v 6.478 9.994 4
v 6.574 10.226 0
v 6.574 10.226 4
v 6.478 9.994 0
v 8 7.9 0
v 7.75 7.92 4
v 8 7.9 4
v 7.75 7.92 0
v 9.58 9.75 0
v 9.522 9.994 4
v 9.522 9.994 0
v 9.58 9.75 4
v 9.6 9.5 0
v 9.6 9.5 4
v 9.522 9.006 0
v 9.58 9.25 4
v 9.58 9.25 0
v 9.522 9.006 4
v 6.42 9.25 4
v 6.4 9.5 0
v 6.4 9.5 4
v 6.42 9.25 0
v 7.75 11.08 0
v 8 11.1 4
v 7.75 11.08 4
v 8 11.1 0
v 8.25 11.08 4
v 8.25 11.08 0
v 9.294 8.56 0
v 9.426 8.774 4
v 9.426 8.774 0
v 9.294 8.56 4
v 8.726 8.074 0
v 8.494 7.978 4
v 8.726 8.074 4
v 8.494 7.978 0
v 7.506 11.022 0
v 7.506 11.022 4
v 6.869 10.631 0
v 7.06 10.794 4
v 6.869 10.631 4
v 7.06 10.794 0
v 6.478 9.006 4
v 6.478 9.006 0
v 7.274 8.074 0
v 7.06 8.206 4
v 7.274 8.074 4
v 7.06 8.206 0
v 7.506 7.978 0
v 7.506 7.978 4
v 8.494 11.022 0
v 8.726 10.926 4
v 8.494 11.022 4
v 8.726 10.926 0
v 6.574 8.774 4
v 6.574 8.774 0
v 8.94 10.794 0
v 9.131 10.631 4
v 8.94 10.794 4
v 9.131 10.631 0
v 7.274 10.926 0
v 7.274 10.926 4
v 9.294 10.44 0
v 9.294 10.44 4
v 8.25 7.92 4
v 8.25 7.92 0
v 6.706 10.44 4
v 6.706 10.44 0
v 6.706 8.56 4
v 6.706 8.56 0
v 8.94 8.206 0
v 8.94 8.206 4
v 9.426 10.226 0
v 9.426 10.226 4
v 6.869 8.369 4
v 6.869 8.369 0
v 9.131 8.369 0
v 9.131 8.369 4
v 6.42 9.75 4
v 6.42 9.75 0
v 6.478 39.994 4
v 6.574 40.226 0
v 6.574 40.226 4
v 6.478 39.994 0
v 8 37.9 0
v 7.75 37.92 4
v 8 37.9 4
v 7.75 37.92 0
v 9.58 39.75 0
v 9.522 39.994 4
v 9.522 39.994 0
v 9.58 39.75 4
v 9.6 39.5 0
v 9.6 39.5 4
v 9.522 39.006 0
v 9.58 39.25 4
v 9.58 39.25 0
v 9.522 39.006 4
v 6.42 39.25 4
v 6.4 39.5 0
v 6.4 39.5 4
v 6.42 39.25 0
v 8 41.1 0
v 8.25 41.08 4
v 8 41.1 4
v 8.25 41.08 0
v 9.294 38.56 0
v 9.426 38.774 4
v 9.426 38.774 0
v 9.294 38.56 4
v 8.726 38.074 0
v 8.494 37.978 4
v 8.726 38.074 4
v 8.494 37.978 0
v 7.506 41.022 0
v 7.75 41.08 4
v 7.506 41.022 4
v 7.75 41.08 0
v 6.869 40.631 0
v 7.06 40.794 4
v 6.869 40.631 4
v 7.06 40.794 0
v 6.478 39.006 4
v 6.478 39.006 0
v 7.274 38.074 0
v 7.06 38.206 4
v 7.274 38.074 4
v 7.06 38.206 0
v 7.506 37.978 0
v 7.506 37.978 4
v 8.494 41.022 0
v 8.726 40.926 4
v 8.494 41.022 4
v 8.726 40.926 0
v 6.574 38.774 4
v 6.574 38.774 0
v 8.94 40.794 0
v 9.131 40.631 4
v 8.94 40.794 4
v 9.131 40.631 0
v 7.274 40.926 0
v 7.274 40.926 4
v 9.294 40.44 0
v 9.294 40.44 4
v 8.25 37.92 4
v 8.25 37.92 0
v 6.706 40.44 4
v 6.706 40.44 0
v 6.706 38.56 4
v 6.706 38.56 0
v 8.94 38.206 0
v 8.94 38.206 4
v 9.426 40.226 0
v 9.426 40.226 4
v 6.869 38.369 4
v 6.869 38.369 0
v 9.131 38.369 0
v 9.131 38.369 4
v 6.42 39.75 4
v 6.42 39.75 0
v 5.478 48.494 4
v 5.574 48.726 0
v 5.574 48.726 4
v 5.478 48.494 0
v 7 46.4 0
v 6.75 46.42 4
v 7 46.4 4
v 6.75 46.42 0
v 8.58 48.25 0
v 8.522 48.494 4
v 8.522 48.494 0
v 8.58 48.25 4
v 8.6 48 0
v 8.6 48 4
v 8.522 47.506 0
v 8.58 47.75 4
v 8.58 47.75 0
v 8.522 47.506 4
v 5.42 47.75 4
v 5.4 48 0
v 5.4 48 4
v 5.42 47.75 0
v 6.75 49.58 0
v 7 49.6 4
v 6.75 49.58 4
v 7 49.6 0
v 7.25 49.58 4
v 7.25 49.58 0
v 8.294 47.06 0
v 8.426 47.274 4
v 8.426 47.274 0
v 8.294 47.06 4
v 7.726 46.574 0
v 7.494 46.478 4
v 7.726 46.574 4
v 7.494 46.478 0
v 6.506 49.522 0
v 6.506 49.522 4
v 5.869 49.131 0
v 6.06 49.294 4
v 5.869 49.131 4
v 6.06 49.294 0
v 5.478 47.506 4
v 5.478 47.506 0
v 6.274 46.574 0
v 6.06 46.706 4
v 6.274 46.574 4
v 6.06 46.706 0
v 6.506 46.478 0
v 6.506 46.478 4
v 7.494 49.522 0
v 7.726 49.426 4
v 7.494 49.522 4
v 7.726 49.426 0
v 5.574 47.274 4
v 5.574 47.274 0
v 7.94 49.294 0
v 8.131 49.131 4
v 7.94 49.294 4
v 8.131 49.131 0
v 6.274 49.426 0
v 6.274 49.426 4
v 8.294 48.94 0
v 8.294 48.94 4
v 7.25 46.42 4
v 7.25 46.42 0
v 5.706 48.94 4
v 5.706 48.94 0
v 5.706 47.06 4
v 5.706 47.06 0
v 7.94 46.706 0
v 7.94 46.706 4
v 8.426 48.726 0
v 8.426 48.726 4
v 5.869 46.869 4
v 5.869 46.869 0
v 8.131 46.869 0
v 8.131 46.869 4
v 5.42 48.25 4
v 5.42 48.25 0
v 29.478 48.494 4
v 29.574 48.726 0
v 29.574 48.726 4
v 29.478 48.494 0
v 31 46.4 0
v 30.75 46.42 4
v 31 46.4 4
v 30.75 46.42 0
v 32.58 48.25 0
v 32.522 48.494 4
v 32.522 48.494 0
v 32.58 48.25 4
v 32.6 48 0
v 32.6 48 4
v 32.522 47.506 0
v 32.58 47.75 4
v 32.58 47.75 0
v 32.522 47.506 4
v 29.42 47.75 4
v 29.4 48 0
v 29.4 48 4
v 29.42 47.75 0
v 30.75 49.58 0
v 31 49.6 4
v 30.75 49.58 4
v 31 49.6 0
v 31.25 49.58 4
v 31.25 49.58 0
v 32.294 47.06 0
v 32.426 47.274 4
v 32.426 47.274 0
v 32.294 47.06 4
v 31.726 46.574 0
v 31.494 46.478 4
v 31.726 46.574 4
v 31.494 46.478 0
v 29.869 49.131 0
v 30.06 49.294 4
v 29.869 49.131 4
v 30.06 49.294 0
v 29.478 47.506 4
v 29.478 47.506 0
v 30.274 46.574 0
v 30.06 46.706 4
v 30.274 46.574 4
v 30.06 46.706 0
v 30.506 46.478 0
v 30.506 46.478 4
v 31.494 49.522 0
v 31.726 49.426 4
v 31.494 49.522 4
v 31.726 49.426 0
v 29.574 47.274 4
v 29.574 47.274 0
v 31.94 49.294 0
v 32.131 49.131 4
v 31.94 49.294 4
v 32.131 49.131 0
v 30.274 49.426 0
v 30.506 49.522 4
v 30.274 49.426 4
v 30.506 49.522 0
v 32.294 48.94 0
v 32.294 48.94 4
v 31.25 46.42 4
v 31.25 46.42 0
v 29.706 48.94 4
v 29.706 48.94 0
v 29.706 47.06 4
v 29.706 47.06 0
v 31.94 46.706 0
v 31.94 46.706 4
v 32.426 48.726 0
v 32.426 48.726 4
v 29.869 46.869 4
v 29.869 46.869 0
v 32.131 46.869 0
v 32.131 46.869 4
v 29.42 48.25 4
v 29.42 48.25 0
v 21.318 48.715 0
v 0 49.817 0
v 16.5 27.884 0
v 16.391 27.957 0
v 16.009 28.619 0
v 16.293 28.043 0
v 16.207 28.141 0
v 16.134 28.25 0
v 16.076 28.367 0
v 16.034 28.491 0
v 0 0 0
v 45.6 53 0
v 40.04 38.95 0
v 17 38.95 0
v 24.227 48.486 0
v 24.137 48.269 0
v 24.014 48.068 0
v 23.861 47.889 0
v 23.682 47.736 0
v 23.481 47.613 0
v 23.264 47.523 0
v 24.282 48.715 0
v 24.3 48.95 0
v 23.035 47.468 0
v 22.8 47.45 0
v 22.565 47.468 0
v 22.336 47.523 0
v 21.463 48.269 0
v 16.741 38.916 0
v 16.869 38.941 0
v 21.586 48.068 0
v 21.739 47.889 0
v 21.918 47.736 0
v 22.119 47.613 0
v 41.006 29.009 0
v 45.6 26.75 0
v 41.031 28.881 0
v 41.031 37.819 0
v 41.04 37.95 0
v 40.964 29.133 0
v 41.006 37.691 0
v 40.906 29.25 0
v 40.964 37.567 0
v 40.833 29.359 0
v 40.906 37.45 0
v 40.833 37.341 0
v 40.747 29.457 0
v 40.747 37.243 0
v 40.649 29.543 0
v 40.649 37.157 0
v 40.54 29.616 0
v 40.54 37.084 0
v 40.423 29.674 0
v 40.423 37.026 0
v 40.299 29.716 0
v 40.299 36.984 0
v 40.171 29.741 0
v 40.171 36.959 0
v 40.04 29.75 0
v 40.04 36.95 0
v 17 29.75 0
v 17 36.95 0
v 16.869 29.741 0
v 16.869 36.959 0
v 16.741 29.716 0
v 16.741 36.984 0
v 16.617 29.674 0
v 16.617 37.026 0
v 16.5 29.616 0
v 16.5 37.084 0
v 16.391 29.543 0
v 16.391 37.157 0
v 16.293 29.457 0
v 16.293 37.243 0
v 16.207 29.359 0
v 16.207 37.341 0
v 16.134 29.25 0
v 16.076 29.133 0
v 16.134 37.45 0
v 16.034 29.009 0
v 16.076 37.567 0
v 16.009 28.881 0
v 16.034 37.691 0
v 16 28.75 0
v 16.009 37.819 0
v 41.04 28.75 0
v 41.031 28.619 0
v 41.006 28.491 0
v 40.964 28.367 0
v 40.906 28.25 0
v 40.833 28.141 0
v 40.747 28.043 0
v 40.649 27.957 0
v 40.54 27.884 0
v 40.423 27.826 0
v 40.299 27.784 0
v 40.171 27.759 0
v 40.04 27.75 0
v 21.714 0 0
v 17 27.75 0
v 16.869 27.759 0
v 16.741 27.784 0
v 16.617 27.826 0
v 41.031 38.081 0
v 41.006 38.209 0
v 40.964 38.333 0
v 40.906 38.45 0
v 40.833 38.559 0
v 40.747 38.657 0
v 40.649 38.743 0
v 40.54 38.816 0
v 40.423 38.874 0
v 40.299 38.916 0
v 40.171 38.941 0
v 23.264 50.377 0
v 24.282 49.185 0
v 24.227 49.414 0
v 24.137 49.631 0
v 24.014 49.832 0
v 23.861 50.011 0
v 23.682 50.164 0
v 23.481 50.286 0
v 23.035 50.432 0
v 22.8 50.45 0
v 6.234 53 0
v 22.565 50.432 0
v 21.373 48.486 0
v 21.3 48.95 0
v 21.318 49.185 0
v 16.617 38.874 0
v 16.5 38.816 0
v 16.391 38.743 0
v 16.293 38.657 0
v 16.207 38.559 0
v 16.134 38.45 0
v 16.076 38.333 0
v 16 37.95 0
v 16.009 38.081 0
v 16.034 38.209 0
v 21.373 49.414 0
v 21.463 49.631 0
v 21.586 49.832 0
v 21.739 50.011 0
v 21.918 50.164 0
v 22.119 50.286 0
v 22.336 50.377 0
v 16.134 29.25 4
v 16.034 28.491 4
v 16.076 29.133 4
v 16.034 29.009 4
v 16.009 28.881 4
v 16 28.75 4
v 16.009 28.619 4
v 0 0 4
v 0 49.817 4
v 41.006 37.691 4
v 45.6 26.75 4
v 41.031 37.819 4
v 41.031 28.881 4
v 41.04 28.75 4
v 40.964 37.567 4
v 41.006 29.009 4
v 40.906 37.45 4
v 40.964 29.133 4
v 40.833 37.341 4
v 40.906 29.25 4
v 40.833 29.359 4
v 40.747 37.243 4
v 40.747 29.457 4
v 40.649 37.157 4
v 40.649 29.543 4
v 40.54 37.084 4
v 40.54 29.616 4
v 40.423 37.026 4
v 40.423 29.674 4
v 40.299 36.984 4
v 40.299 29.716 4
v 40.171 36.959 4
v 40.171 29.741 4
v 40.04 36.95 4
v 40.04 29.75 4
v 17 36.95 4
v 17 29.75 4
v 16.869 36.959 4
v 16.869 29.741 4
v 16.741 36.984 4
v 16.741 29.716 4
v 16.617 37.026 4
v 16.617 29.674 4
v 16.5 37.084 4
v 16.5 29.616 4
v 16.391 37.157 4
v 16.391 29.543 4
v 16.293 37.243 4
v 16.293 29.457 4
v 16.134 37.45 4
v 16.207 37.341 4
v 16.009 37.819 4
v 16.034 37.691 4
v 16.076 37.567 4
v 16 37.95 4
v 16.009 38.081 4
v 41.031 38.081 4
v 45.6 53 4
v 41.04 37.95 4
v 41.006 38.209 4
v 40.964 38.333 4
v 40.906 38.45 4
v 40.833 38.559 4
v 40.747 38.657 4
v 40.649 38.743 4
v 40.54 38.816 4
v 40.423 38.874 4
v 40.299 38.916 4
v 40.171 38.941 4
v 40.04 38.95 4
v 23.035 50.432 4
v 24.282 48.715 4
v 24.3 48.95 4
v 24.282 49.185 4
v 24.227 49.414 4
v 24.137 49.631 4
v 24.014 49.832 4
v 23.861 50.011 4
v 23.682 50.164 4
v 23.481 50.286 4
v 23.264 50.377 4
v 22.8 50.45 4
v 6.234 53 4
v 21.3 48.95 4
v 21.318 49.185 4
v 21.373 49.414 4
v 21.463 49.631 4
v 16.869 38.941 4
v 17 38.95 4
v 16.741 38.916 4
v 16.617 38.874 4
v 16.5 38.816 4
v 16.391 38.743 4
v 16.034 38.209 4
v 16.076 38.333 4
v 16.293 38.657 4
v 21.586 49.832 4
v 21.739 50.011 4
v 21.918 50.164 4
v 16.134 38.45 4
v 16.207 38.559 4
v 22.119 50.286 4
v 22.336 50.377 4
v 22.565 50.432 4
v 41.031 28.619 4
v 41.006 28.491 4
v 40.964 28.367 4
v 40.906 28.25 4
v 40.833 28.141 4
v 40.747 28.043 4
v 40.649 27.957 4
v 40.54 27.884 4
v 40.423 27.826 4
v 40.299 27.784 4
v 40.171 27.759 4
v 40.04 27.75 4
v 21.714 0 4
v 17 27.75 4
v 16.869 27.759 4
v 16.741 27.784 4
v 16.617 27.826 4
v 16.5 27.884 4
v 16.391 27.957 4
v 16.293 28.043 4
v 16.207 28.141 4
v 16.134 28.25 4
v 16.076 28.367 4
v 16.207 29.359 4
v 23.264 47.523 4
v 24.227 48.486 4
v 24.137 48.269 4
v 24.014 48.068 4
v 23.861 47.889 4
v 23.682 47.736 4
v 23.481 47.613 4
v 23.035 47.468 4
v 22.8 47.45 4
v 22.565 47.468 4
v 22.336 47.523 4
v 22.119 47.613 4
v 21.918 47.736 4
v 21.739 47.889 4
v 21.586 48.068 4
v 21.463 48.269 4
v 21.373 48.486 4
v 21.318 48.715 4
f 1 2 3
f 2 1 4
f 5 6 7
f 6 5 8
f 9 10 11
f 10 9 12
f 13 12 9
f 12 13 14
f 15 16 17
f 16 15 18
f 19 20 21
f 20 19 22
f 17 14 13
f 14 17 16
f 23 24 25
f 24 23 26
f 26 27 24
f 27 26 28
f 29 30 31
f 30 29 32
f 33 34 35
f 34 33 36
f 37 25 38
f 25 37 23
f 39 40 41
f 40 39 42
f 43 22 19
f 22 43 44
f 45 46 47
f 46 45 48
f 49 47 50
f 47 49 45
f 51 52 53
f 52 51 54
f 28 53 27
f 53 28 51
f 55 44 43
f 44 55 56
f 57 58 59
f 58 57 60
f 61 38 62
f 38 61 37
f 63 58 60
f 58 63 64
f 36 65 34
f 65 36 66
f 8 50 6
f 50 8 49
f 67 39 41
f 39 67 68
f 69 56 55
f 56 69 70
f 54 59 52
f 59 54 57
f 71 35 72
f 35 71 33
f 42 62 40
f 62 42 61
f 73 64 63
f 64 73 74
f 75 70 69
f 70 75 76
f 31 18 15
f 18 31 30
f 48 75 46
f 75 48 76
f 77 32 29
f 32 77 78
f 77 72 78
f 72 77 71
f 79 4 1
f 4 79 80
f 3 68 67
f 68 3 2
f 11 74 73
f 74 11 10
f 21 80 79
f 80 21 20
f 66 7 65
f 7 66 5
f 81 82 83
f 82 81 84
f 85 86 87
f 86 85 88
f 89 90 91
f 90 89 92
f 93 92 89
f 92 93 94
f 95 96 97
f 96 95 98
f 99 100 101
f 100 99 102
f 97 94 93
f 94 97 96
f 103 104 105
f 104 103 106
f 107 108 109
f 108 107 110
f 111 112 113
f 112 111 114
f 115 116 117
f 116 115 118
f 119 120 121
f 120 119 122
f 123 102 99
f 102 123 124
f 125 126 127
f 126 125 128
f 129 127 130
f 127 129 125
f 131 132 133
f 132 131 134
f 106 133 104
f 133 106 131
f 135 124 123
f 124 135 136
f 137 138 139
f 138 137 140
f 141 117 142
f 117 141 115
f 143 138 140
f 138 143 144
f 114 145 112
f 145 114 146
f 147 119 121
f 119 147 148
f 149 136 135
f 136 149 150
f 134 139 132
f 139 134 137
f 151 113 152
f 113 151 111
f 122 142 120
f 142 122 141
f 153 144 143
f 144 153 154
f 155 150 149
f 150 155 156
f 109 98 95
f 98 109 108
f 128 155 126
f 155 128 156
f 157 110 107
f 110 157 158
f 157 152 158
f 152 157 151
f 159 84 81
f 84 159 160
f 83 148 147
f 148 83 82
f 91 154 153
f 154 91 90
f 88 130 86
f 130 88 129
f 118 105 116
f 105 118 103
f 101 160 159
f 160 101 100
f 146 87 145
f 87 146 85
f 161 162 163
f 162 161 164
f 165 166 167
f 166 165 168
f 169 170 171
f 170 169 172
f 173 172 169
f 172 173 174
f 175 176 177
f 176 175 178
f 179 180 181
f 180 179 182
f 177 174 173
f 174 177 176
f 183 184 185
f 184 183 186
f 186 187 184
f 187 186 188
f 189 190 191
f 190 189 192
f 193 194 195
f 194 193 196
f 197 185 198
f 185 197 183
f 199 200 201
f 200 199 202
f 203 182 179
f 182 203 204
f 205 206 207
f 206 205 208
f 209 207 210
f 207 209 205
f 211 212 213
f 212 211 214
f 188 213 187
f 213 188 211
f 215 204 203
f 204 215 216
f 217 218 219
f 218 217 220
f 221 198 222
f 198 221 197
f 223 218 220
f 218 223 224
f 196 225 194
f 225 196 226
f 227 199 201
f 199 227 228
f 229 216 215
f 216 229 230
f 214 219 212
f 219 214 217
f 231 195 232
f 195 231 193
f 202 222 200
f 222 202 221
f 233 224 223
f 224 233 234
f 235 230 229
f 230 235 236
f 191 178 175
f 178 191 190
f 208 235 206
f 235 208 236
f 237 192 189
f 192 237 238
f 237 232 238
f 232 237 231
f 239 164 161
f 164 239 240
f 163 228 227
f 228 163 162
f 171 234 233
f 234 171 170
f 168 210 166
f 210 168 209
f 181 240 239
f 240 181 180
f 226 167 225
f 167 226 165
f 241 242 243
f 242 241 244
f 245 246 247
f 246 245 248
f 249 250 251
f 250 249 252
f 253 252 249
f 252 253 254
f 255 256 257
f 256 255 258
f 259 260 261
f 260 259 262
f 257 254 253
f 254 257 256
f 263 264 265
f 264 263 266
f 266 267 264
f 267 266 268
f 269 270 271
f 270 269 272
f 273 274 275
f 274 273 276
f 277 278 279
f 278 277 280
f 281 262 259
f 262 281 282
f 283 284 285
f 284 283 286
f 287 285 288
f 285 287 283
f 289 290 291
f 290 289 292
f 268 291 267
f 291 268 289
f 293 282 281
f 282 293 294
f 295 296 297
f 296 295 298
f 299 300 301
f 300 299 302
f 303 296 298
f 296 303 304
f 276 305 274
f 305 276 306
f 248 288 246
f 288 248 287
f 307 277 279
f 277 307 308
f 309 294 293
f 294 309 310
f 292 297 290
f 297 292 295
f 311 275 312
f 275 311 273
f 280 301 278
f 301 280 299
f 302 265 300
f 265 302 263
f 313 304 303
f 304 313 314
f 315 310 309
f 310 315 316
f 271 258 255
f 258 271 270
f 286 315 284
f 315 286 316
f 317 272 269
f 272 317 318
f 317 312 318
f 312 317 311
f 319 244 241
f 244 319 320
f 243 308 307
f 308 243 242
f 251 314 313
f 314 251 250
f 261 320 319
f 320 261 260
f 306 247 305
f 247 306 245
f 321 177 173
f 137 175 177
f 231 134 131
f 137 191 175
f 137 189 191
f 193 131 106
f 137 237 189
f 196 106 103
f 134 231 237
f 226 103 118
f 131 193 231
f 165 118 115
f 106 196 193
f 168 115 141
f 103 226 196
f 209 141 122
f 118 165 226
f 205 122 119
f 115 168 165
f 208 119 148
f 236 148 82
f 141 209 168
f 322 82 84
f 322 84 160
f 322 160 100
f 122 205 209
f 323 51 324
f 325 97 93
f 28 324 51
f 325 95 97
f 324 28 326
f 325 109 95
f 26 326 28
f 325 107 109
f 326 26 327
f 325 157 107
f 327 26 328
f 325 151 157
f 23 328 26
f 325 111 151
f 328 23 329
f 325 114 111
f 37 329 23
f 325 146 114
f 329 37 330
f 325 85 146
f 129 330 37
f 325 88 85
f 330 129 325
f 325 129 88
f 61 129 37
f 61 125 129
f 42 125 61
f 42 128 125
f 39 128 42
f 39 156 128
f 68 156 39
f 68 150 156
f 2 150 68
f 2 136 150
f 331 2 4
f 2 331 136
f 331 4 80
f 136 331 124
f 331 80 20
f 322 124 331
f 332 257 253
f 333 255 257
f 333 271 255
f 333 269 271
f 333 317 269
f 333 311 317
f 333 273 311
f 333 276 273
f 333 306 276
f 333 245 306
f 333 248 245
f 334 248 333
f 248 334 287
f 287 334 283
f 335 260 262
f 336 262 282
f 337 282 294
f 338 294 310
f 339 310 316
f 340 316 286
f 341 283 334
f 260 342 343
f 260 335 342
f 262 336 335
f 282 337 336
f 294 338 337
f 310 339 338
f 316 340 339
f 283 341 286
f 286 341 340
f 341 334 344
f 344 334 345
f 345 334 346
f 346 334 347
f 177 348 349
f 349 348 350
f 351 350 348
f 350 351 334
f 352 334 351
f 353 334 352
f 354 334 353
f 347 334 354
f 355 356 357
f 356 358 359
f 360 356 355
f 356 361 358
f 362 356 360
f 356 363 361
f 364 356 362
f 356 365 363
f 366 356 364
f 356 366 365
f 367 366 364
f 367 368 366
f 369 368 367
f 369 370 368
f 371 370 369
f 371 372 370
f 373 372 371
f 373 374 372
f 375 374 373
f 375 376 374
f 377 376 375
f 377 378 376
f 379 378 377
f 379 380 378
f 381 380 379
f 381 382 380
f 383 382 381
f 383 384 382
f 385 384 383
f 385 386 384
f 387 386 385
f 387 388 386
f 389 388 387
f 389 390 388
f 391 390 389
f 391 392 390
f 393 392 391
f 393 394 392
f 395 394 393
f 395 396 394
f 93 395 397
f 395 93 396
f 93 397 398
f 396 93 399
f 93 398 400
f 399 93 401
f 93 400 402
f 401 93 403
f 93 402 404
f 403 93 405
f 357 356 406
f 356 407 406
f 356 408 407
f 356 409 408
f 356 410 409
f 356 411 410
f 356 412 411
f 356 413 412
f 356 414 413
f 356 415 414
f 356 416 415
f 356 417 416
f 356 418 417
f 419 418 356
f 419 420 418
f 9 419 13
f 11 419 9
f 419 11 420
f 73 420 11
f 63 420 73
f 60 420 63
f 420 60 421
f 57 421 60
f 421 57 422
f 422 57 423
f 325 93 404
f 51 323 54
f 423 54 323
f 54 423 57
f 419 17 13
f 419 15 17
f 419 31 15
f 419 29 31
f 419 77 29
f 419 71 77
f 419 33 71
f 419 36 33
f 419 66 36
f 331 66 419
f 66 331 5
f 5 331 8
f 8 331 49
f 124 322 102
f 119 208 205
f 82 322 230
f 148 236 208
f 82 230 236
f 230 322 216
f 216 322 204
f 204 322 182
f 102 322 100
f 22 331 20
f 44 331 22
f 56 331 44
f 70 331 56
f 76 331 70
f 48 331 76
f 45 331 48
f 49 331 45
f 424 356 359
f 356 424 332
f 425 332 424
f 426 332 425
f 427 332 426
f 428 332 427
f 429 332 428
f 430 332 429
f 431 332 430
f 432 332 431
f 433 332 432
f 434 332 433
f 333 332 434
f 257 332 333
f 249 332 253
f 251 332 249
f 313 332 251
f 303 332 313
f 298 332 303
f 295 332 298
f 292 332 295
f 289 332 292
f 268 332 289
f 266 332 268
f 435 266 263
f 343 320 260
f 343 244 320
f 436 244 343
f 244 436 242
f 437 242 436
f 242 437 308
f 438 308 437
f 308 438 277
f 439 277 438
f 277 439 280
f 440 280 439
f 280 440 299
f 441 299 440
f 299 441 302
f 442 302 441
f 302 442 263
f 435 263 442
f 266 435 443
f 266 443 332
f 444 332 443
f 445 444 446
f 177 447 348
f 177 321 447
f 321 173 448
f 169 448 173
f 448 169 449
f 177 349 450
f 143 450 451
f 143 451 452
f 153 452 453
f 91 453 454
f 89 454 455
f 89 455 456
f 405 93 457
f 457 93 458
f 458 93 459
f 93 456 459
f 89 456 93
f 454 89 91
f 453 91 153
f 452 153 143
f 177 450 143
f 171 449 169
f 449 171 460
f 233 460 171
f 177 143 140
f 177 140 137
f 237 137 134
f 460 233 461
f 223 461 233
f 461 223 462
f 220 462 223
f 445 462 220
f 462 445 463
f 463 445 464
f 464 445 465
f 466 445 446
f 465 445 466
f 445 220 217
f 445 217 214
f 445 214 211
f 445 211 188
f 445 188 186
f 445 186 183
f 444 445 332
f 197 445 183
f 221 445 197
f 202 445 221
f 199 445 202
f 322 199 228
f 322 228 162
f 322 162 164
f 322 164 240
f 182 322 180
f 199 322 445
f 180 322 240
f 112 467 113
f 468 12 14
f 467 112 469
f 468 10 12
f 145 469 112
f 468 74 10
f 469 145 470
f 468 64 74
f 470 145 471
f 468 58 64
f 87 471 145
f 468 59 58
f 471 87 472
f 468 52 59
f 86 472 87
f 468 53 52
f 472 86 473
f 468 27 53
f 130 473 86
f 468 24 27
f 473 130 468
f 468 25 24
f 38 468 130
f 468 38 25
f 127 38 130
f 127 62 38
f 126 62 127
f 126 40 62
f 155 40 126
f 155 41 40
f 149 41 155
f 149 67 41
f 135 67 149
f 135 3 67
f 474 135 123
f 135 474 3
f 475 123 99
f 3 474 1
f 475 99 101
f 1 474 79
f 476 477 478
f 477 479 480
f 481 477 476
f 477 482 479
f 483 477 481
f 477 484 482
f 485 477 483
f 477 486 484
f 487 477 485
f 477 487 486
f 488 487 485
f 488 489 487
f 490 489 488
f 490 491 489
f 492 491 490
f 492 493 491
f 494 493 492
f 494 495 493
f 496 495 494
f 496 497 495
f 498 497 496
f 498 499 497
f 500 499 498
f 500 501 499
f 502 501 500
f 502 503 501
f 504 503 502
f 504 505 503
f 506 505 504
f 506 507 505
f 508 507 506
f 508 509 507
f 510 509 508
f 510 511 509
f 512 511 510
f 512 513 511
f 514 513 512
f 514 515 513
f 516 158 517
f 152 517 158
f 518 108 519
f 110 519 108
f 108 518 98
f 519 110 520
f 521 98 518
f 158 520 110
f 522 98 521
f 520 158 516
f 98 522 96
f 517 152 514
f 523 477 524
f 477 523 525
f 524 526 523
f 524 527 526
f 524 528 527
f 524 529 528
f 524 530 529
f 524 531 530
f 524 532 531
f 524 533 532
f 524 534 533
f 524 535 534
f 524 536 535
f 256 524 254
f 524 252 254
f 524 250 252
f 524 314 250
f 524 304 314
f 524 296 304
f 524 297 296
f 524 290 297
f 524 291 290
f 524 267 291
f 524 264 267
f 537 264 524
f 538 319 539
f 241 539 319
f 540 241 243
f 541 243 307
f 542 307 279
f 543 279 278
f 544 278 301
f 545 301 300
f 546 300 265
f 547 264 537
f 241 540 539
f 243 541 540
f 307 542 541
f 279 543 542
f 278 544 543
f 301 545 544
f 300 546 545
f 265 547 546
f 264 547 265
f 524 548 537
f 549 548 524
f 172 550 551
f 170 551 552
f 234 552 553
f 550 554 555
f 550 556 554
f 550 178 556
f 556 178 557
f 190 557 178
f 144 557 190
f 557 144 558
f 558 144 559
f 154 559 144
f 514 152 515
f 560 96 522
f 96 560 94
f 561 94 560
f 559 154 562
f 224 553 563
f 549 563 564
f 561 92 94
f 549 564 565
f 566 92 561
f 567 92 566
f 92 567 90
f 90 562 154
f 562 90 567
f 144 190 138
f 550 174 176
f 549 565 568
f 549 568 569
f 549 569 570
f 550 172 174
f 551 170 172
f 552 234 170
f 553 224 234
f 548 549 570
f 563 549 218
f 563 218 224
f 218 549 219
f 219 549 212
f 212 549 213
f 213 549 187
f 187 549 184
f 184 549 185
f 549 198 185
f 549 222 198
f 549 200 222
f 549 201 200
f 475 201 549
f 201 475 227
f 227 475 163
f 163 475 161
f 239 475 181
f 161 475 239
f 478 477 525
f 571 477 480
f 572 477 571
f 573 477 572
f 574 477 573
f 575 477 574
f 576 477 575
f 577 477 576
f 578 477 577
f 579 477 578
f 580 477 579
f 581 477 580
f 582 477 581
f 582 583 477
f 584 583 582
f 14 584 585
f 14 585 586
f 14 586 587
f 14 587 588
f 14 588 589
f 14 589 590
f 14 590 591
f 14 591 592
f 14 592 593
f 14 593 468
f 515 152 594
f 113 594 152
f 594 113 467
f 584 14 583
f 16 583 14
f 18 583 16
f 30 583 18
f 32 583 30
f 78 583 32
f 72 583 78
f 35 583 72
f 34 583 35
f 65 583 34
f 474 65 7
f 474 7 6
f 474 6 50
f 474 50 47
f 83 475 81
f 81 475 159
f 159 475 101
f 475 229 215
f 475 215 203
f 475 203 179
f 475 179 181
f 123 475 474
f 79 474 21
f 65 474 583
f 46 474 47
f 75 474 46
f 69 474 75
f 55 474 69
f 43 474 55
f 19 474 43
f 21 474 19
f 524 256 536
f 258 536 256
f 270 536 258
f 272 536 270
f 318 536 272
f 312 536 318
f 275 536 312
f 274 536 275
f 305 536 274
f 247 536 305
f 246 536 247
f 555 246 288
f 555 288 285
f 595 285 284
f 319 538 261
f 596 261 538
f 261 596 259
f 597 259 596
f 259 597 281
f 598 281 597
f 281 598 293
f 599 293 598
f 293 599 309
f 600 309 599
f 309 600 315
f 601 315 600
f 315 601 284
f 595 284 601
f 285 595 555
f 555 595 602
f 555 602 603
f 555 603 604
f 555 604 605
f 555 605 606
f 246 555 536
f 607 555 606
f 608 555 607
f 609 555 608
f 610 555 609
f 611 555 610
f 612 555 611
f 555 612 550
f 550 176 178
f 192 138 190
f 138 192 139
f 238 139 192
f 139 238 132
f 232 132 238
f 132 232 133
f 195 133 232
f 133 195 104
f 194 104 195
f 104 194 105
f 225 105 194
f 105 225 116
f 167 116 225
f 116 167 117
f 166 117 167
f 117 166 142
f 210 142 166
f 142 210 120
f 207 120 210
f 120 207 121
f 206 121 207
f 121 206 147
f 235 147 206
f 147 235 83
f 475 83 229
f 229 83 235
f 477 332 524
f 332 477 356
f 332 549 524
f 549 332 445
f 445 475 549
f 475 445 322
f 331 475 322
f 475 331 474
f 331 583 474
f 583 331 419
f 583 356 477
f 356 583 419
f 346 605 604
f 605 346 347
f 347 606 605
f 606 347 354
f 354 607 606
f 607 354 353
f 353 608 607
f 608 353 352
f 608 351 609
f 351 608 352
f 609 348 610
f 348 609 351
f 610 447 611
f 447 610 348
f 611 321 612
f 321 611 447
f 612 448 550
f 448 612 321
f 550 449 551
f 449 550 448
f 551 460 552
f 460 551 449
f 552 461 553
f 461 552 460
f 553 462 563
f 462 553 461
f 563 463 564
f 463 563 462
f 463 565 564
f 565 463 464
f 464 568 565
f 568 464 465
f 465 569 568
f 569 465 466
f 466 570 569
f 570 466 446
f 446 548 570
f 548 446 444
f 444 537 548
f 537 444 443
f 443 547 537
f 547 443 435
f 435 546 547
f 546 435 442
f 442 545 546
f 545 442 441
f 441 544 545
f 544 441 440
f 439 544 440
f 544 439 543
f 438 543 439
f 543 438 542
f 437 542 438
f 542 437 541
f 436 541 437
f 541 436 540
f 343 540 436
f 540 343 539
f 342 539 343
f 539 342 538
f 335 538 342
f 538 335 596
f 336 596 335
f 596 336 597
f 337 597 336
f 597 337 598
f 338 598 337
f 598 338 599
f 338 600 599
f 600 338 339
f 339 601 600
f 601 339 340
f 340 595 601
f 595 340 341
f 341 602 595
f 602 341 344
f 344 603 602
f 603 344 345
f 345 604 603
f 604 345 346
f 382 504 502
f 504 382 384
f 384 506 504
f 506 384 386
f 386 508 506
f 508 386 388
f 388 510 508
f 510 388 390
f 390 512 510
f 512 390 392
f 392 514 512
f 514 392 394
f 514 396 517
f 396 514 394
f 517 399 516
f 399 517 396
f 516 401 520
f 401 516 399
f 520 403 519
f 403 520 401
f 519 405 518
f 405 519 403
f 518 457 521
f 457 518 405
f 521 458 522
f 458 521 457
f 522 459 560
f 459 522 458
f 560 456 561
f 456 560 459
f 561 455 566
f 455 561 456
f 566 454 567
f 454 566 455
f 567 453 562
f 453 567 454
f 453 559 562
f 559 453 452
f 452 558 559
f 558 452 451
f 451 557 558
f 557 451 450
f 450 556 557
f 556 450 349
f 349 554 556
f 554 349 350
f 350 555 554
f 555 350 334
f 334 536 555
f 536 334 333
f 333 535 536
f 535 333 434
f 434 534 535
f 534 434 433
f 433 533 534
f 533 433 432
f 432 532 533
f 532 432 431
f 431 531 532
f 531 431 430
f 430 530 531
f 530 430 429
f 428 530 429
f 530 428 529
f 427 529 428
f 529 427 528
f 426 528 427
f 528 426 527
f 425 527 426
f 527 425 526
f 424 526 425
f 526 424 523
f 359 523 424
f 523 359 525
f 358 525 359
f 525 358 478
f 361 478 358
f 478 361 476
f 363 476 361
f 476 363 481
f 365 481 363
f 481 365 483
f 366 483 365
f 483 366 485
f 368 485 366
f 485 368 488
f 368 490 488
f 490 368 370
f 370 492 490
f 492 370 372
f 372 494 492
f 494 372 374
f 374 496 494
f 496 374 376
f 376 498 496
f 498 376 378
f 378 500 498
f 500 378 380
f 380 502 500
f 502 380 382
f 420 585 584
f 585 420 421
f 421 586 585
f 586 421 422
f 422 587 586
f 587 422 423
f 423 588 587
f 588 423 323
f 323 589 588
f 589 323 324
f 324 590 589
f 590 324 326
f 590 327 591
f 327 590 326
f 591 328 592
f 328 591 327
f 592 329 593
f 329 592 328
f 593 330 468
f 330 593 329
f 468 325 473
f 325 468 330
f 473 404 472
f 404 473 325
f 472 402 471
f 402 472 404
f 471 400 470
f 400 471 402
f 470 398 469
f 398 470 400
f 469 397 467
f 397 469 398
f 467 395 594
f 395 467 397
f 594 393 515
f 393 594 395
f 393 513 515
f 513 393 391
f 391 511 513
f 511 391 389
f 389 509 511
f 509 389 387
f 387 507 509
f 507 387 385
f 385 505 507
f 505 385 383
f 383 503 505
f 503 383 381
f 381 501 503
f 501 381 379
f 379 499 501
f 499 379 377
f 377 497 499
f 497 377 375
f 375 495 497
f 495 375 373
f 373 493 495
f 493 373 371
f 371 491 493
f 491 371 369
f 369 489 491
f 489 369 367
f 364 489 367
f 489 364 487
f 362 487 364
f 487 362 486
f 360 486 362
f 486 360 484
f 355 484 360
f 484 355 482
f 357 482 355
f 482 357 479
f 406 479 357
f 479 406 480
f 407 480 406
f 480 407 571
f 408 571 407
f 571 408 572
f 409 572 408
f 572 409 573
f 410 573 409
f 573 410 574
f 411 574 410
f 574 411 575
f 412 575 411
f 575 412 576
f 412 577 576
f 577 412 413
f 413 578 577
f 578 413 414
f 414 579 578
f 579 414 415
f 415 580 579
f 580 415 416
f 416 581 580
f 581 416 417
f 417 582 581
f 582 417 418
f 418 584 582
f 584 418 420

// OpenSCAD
/**
 * Module: Head side cover without the tilt horn interface.
 *
 * Author: Karim Aziiev <karim.aziiev@gmail.com>
 * License: GPL-3.0-or-later
 */
use <../head/head_mount.scad>

head_side_panel();
